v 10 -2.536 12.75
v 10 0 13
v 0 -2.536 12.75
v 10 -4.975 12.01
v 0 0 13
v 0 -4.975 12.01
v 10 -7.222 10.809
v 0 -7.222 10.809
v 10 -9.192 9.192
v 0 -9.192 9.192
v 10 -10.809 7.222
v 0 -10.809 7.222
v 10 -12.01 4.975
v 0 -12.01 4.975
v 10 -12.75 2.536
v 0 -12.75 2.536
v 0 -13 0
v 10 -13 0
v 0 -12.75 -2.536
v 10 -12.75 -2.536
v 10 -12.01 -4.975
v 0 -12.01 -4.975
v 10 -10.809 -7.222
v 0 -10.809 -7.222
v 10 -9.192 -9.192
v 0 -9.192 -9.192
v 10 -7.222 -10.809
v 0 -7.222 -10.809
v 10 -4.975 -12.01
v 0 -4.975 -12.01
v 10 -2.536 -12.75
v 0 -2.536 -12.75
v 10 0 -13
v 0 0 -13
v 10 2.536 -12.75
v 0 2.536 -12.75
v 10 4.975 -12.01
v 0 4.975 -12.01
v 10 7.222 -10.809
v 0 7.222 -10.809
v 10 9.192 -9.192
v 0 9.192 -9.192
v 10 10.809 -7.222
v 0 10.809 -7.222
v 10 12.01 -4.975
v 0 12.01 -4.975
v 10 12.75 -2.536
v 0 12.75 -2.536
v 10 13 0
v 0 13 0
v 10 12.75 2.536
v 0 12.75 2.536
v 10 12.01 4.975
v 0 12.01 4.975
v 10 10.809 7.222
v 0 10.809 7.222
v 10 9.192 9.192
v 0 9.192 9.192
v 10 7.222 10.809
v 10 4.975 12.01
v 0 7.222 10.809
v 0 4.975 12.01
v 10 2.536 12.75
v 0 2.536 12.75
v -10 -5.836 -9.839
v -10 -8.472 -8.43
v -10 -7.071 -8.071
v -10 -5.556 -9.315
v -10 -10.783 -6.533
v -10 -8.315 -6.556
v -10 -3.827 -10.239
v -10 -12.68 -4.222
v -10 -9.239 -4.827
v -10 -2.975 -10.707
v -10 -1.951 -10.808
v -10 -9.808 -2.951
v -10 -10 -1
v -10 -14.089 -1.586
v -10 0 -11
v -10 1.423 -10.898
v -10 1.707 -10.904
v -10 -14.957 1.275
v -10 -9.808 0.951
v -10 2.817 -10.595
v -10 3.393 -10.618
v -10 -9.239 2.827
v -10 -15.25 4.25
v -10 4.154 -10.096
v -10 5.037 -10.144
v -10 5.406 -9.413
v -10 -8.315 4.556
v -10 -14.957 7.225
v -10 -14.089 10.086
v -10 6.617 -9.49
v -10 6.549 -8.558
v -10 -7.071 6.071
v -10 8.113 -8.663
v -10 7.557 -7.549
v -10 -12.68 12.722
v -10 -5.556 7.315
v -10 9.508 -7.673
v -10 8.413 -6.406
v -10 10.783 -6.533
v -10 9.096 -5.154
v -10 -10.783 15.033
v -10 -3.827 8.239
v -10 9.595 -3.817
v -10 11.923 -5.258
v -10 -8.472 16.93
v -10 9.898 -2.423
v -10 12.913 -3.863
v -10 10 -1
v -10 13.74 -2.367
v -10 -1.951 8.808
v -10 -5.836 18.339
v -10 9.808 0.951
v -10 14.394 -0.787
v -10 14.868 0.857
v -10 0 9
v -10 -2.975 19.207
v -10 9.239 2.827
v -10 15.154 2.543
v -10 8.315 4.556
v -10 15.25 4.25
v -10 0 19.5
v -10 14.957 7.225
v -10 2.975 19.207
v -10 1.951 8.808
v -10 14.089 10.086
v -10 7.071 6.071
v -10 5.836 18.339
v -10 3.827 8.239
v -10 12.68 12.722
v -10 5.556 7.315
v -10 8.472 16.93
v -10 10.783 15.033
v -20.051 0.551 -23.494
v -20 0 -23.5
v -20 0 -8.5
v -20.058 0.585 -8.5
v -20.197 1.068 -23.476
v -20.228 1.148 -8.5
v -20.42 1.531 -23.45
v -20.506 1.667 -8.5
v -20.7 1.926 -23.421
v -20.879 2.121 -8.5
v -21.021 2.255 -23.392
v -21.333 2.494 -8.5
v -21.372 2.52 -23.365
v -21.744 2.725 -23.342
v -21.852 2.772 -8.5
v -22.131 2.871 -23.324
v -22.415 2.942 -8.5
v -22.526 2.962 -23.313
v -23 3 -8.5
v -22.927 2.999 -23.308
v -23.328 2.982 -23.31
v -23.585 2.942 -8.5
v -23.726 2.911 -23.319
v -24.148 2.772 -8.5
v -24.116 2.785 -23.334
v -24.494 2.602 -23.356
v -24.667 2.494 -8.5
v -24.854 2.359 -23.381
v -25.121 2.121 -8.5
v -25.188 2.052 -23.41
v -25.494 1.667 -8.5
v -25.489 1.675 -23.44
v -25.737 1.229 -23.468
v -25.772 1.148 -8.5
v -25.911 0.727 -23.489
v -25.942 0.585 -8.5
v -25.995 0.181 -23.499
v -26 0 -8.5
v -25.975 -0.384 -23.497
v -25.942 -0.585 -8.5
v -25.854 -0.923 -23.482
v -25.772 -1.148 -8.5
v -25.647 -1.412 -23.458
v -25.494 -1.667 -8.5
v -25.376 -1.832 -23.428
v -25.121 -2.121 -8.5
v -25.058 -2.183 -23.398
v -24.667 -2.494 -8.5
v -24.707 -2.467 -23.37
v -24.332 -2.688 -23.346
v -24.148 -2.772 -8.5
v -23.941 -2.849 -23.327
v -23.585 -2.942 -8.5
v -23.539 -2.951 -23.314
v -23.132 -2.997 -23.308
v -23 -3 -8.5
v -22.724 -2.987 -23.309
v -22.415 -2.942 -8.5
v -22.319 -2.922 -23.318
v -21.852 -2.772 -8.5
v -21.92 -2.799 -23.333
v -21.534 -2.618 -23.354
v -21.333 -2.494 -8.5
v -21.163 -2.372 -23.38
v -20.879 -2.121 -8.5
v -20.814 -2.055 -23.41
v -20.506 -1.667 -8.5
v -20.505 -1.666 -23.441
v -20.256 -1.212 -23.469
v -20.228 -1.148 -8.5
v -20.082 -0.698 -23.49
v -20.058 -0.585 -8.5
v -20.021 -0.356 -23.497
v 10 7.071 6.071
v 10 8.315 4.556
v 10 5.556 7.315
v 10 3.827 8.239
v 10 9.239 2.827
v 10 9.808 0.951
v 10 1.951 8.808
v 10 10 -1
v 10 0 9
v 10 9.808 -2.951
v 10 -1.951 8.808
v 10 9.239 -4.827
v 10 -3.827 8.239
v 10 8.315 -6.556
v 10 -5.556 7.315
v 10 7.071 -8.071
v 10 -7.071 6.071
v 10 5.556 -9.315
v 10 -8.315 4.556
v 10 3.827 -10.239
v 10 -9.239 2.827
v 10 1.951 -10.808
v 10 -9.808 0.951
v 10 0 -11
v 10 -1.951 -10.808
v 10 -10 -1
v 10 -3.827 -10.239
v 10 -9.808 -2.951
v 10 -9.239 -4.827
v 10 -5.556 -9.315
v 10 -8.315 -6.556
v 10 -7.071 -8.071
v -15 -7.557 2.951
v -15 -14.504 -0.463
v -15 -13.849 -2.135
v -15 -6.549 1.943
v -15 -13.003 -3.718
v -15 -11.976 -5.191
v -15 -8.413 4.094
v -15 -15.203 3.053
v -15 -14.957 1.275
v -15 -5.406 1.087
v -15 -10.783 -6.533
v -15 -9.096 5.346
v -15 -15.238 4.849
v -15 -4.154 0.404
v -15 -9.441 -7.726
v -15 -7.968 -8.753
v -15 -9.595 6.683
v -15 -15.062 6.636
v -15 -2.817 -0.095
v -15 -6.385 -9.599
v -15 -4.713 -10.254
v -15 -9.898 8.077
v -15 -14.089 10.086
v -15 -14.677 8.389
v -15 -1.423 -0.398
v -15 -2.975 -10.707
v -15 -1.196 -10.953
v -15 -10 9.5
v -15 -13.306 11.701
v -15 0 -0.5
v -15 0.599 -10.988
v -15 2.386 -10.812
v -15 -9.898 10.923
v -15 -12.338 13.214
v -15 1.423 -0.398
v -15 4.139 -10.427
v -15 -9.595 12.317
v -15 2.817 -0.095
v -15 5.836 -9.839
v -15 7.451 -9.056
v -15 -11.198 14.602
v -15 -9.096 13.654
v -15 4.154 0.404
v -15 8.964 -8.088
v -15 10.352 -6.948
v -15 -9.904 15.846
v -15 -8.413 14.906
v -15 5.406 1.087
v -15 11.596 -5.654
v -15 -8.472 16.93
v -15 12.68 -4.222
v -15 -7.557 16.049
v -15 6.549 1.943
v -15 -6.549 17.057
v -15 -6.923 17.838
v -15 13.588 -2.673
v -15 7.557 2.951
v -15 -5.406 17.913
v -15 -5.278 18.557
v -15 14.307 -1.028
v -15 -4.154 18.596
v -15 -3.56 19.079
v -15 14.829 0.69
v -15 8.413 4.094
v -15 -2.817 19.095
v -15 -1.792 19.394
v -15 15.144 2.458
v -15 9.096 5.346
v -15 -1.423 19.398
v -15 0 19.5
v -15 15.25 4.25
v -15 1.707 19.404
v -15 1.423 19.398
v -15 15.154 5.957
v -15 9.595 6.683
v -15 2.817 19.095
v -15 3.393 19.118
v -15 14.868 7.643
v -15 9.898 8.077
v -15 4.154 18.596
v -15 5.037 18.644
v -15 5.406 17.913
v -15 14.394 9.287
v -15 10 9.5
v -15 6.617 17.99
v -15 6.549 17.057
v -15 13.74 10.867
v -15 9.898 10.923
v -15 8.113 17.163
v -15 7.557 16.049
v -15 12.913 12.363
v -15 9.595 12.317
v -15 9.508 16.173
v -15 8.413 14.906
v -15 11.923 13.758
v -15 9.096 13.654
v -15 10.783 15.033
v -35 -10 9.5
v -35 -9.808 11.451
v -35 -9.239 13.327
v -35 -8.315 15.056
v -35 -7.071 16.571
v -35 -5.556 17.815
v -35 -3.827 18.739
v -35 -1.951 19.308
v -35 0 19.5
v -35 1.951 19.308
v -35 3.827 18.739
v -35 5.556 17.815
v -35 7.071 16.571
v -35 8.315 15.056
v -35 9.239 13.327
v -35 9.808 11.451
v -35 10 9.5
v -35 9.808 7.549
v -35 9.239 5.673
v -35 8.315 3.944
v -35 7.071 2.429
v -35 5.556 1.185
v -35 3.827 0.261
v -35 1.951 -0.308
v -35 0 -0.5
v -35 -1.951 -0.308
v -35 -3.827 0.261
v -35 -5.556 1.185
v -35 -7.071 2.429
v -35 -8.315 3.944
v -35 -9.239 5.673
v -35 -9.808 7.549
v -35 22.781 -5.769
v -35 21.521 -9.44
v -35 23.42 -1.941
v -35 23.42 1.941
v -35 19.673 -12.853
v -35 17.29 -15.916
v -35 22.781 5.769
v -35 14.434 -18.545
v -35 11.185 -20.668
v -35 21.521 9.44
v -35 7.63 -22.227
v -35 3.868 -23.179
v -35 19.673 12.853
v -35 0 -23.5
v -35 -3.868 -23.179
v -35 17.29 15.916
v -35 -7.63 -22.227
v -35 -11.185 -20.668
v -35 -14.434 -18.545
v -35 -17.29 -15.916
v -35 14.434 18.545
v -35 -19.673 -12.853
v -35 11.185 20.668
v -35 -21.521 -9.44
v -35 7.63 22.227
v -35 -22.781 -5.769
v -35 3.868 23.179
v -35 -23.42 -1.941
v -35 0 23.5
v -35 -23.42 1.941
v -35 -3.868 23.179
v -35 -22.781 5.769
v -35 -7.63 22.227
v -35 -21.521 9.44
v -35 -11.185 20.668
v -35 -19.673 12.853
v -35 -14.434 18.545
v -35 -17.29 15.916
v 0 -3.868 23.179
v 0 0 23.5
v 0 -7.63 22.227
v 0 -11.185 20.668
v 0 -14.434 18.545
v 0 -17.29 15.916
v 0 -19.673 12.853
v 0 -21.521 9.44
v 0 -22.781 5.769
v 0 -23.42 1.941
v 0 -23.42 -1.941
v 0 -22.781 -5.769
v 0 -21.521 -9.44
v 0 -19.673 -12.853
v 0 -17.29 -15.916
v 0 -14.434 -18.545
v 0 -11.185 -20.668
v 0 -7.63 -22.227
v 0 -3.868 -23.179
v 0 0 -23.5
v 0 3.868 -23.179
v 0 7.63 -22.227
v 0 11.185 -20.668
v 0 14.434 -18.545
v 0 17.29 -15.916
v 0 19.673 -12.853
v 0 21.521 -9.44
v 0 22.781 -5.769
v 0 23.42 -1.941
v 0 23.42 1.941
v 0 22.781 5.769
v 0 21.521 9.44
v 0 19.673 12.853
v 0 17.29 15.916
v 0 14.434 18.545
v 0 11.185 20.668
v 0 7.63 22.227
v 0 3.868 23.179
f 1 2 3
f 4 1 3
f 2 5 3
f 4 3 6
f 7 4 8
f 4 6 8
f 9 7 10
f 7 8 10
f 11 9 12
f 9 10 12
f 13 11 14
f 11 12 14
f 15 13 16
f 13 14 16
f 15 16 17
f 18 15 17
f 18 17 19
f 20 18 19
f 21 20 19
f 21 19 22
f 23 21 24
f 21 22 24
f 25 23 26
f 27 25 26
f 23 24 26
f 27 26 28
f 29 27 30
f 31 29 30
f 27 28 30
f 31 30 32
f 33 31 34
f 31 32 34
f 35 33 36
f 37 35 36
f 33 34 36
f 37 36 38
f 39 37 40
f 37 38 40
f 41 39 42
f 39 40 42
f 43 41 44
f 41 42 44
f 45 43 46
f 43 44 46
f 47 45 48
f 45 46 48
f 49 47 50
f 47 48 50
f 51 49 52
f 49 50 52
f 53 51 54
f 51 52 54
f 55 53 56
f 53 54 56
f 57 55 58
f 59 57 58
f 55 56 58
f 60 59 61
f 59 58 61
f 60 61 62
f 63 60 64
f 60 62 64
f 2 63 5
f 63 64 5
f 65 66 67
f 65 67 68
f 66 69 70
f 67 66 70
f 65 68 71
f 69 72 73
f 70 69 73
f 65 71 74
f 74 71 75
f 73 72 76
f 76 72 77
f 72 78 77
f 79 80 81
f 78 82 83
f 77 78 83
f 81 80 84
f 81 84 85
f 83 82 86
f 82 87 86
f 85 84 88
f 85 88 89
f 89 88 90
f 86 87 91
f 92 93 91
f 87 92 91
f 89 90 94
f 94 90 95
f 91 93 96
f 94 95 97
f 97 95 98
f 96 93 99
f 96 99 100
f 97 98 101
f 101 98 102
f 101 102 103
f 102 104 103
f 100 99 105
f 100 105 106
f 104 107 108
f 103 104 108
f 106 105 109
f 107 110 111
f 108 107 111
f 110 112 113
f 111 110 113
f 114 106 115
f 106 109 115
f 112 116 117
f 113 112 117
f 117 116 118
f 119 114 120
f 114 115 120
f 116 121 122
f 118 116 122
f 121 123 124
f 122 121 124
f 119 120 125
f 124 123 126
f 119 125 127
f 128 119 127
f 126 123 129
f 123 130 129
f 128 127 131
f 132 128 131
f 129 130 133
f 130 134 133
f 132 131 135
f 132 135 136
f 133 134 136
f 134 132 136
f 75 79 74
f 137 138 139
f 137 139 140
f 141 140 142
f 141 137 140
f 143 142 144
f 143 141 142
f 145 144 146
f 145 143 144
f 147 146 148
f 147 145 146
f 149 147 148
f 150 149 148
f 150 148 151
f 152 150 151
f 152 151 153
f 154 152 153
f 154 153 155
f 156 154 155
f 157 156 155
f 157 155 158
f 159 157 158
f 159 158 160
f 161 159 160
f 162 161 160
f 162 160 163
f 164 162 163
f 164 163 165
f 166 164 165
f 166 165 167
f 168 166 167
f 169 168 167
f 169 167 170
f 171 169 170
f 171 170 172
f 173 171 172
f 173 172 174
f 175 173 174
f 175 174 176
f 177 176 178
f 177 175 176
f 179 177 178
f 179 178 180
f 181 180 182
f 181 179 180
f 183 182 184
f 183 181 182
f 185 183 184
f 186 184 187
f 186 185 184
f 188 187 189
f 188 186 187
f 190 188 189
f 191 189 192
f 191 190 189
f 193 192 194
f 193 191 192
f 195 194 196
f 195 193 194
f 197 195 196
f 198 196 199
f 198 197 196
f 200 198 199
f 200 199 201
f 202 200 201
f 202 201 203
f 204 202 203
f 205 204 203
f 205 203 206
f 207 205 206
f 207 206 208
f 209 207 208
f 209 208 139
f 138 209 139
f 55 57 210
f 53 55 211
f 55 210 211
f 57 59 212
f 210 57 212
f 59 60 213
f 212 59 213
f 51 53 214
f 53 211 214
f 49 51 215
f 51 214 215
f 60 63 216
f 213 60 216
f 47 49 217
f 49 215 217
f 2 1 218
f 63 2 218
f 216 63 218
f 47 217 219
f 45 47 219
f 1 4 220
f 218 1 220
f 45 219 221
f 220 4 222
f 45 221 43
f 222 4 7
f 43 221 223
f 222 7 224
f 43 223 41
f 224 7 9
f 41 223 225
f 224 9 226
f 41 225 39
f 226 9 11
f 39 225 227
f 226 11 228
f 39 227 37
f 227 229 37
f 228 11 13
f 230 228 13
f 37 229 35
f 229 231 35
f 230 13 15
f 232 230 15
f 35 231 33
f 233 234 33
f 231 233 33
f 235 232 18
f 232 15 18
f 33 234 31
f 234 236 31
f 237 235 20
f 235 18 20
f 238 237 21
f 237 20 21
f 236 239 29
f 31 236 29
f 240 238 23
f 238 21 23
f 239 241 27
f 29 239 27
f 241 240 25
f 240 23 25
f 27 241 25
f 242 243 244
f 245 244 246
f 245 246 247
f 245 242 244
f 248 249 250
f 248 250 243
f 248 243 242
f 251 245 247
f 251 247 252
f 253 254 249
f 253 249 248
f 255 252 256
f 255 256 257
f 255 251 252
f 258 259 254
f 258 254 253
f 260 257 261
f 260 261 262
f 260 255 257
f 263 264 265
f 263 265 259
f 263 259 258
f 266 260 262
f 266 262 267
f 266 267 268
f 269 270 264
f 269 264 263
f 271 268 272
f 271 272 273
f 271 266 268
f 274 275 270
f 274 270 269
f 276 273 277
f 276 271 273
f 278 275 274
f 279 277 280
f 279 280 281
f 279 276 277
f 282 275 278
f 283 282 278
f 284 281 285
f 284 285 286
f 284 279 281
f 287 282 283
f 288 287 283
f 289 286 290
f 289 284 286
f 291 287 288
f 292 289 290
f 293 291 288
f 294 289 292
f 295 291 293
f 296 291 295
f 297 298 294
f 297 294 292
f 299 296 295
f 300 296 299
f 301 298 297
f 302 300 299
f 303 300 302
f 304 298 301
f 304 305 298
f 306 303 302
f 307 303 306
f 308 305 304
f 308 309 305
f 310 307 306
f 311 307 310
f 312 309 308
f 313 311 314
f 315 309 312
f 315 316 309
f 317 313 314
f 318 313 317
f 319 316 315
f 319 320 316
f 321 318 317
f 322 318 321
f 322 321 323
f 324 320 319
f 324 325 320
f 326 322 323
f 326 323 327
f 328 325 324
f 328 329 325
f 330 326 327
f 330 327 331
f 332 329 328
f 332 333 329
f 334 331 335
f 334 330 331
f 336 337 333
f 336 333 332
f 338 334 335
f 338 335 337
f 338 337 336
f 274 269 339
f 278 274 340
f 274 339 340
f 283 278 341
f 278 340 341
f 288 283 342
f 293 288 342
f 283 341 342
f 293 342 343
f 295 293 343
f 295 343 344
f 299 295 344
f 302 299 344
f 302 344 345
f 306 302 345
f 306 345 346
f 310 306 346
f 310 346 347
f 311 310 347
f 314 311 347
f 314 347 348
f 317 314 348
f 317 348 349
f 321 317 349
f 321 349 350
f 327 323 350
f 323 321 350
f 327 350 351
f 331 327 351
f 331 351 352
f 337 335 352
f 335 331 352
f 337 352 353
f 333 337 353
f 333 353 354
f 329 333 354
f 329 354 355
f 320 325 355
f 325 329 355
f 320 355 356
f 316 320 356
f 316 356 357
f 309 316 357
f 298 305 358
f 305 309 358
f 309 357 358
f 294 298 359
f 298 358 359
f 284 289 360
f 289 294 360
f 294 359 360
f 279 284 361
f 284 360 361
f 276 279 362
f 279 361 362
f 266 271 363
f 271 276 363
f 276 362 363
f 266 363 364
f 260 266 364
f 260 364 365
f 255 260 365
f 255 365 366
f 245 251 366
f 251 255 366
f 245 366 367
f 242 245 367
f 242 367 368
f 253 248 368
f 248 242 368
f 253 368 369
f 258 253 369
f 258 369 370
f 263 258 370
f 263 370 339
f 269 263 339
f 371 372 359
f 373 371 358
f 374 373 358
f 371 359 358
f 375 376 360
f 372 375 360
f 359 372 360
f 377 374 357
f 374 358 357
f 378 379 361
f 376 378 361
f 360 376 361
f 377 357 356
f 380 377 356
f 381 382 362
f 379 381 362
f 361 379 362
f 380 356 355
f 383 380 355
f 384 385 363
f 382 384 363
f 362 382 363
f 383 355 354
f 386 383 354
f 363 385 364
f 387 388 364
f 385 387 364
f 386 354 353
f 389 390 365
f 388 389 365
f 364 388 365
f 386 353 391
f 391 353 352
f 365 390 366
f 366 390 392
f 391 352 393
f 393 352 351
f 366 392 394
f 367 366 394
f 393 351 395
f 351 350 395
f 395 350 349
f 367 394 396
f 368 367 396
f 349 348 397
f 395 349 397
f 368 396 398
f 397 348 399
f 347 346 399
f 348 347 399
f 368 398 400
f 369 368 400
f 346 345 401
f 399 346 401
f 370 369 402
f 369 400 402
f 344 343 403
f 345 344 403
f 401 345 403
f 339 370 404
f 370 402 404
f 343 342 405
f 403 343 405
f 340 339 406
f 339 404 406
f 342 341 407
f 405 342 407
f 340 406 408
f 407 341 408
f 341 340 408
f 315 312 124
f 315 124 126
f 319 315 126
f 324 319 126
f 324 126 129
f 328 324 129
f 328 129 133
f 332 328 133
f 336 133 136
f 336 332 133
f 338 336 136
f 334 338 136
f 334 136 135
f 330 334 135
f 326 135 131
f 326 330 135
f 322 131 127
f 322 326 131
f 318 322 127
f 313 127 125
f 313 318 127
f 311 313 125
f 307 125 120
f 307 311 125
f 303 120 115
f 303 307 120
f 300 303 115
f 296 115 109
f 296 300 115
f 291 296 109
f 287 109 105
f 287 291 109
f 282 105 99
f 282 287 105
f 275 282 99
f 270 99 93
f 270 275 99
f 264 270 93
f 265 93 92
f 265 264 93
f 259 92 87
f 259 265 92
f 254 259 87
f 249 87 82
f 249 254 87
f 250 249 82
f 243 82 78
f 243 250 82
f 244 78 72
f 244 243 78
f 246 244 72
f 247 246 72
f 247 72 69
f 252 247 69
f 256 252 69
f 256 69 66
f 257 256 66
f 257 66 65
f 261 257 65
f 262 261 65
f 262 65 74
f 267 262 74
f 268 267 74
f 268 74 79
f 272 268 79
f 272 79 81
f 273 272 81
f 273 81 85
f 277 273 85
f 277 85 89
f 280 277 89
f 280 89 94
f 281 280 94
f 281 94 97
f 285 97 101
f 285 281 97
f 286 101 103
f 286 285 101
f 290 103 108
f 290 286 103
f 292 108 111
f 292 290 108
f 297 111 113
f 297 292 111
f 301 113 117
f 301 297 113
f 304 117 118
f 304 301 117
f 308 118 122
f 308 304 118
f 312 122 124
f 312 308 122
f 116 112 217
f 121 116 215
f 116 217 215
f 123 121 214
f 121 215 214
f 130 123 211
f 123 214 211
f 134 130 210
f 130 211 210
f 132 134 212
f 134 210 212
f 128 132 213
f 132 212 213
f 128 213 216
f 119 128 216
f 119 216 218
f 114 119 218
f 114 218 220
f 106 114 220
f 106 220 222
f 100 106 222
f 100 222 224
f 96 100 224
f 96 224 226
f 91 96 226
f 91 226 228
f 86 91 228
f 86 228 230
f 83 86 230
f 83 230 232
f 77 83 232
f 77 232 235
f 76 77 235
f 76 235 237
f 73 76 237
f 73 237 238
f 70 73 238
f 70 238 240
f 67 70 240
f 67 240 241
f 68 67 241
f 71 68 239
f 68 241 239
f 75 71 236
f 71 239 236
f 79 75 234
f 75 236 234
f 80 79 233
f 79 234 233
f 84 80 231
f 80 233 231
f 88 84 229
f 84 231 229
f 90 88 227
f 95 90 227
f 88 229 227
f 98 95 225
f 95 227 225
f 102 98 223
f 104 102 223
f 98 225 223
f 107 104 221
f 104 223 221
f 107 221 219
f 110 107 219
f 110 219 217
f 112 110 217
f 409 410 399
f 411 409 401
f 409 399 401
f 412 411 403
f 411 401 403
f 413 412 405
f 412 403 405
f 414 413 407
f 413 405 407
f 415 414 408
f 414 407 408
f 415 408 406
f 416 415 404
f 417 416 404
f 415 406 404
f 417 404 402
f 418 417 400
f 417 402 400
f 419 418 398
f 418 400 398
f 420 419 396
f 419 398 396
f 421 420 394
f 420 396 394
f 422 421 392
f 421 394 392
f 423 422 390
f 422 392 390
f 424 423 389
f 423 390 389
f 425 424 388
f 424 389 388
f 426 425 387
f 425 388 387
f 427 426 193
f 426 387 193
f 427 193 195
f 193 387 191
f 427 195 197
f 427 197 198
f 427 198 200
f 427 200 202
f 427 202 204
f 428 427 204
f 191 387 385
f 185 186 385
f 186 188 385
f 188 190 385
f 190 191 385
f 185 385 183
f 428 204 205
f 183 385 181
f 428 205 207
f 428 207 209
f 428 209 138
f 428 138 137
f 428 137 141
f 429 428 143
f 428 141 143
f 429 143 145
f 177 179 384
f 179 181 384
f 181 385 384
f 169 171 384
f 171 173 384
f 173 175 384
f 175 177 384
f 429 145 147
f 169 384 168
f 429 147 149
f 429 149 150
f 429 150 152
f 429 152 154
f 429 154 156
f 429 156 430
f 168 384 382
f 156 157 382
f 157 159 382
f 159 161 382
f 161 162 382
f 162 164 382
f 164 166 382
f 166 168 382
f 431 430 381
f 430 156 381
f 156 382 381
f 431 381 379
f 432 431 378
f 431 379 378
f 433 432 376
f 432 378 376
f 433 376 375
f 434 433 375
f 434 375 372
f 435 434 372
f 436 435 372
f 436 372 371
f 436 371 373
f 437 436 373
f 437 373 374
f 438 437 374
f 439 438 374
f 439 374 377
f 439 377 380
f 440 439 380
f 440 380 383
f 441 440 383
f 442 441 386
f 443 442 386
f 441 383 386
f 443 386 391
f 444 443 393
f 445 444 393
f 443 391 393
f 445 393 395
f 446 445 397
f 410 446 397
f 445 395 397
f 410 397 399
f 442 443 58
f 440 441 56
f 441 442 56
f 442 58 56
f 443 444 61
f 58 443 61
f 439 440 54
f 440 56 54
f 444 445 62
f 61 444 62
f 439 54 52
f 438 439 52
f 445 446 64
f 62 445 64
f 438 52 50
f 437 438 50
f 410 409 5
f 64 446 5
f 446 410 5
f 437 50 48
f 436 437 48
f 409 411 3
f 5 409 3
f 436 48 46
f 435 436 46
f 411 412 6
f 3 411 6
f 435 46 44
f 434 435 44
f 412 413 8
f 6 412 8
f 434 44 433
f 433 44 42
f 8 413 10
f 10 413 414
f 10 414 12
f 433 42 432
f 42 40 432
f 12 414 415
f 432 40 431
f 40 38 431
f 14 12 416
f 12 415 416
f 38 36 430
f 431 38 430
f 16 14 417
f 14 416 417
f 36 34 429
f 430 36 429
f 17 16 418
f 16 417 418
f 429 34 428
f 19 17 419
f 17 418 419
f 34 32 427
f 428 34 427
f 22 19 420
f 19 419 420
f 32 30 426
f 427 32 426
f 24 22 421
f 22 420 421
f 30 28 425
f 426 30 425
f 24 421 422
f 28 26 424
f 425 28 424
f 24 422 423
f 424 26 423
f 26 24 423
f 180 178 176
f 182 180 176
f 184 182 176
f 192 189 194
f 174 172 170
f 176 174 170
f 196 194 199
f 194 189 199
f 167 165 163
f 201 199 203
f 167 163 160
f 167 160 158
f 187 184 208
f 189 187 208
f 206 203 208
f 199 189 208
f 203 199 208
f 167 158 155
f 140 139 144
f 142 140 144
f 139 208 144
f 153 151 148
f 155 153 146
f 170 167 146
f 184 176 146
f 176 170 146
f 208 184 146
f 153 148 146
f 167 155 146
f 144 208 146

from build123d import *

# Parameters (mm, degrees)
F2_R      = 10
F3_DEPTH  = 25
F4_R      = 10
F5_DEPTH  = 20
F6_R      = 15.25
F7_DEPTH  = 5
F9_R      = 3
F10_DEPTH = 15


with BuildPart() as f1:
    # F0 (on Front) → F1 (revolve)
    with BuildSketch(Plane.XZ):
        Polygon((-35, 23.5), (-35, 0), (10, 0), (10, 13), (0, 13), (0, 23.5), align=None)
    revolve(axis=Axis((-3.193799, 0, 0), (1, 0, 0)))

    # F2 (on face) → F3 (cut)
    with BuildSketch(Plane.YZ.offset(10)):
        with Locations((0, -1)):
            Circle(F2_R)
    extrude(amount=-F3_DEPTH, mode=Mode.SUBTRACT)

    # F4 (on face) → F5 (cut)
    with BuildSketch(Plane(origin=(-35, 0, 0), x_dir=(0, -1, 0), z_dir=(-1, 0, 0))):
        with Locations((0, 9.5)):
            Circle(F4_R)
    extrude(amount=-F5_DEPTH, mode=Mode.SUBTRACT)

    # F6 (on face) → F7 (cut)
    with BuildSketch(Plane.YZ.offset(-15)):
        with Locations((3e-06, 4.25)):
            Circle(F6_R)
    extrude(amount=F7_DEPTH, mode=Mode.SUBTRACT)

    # F9 (on offset) → F10 (cut)
    with BuildSketch(Plane.XY.offset(-23.5)):
        with Locations((-23, 0)):
            Circle(F9_R)
    extrude(amount=F10_DEPTH, mode=Mode.SUBTRACT)


solid = f1.part
